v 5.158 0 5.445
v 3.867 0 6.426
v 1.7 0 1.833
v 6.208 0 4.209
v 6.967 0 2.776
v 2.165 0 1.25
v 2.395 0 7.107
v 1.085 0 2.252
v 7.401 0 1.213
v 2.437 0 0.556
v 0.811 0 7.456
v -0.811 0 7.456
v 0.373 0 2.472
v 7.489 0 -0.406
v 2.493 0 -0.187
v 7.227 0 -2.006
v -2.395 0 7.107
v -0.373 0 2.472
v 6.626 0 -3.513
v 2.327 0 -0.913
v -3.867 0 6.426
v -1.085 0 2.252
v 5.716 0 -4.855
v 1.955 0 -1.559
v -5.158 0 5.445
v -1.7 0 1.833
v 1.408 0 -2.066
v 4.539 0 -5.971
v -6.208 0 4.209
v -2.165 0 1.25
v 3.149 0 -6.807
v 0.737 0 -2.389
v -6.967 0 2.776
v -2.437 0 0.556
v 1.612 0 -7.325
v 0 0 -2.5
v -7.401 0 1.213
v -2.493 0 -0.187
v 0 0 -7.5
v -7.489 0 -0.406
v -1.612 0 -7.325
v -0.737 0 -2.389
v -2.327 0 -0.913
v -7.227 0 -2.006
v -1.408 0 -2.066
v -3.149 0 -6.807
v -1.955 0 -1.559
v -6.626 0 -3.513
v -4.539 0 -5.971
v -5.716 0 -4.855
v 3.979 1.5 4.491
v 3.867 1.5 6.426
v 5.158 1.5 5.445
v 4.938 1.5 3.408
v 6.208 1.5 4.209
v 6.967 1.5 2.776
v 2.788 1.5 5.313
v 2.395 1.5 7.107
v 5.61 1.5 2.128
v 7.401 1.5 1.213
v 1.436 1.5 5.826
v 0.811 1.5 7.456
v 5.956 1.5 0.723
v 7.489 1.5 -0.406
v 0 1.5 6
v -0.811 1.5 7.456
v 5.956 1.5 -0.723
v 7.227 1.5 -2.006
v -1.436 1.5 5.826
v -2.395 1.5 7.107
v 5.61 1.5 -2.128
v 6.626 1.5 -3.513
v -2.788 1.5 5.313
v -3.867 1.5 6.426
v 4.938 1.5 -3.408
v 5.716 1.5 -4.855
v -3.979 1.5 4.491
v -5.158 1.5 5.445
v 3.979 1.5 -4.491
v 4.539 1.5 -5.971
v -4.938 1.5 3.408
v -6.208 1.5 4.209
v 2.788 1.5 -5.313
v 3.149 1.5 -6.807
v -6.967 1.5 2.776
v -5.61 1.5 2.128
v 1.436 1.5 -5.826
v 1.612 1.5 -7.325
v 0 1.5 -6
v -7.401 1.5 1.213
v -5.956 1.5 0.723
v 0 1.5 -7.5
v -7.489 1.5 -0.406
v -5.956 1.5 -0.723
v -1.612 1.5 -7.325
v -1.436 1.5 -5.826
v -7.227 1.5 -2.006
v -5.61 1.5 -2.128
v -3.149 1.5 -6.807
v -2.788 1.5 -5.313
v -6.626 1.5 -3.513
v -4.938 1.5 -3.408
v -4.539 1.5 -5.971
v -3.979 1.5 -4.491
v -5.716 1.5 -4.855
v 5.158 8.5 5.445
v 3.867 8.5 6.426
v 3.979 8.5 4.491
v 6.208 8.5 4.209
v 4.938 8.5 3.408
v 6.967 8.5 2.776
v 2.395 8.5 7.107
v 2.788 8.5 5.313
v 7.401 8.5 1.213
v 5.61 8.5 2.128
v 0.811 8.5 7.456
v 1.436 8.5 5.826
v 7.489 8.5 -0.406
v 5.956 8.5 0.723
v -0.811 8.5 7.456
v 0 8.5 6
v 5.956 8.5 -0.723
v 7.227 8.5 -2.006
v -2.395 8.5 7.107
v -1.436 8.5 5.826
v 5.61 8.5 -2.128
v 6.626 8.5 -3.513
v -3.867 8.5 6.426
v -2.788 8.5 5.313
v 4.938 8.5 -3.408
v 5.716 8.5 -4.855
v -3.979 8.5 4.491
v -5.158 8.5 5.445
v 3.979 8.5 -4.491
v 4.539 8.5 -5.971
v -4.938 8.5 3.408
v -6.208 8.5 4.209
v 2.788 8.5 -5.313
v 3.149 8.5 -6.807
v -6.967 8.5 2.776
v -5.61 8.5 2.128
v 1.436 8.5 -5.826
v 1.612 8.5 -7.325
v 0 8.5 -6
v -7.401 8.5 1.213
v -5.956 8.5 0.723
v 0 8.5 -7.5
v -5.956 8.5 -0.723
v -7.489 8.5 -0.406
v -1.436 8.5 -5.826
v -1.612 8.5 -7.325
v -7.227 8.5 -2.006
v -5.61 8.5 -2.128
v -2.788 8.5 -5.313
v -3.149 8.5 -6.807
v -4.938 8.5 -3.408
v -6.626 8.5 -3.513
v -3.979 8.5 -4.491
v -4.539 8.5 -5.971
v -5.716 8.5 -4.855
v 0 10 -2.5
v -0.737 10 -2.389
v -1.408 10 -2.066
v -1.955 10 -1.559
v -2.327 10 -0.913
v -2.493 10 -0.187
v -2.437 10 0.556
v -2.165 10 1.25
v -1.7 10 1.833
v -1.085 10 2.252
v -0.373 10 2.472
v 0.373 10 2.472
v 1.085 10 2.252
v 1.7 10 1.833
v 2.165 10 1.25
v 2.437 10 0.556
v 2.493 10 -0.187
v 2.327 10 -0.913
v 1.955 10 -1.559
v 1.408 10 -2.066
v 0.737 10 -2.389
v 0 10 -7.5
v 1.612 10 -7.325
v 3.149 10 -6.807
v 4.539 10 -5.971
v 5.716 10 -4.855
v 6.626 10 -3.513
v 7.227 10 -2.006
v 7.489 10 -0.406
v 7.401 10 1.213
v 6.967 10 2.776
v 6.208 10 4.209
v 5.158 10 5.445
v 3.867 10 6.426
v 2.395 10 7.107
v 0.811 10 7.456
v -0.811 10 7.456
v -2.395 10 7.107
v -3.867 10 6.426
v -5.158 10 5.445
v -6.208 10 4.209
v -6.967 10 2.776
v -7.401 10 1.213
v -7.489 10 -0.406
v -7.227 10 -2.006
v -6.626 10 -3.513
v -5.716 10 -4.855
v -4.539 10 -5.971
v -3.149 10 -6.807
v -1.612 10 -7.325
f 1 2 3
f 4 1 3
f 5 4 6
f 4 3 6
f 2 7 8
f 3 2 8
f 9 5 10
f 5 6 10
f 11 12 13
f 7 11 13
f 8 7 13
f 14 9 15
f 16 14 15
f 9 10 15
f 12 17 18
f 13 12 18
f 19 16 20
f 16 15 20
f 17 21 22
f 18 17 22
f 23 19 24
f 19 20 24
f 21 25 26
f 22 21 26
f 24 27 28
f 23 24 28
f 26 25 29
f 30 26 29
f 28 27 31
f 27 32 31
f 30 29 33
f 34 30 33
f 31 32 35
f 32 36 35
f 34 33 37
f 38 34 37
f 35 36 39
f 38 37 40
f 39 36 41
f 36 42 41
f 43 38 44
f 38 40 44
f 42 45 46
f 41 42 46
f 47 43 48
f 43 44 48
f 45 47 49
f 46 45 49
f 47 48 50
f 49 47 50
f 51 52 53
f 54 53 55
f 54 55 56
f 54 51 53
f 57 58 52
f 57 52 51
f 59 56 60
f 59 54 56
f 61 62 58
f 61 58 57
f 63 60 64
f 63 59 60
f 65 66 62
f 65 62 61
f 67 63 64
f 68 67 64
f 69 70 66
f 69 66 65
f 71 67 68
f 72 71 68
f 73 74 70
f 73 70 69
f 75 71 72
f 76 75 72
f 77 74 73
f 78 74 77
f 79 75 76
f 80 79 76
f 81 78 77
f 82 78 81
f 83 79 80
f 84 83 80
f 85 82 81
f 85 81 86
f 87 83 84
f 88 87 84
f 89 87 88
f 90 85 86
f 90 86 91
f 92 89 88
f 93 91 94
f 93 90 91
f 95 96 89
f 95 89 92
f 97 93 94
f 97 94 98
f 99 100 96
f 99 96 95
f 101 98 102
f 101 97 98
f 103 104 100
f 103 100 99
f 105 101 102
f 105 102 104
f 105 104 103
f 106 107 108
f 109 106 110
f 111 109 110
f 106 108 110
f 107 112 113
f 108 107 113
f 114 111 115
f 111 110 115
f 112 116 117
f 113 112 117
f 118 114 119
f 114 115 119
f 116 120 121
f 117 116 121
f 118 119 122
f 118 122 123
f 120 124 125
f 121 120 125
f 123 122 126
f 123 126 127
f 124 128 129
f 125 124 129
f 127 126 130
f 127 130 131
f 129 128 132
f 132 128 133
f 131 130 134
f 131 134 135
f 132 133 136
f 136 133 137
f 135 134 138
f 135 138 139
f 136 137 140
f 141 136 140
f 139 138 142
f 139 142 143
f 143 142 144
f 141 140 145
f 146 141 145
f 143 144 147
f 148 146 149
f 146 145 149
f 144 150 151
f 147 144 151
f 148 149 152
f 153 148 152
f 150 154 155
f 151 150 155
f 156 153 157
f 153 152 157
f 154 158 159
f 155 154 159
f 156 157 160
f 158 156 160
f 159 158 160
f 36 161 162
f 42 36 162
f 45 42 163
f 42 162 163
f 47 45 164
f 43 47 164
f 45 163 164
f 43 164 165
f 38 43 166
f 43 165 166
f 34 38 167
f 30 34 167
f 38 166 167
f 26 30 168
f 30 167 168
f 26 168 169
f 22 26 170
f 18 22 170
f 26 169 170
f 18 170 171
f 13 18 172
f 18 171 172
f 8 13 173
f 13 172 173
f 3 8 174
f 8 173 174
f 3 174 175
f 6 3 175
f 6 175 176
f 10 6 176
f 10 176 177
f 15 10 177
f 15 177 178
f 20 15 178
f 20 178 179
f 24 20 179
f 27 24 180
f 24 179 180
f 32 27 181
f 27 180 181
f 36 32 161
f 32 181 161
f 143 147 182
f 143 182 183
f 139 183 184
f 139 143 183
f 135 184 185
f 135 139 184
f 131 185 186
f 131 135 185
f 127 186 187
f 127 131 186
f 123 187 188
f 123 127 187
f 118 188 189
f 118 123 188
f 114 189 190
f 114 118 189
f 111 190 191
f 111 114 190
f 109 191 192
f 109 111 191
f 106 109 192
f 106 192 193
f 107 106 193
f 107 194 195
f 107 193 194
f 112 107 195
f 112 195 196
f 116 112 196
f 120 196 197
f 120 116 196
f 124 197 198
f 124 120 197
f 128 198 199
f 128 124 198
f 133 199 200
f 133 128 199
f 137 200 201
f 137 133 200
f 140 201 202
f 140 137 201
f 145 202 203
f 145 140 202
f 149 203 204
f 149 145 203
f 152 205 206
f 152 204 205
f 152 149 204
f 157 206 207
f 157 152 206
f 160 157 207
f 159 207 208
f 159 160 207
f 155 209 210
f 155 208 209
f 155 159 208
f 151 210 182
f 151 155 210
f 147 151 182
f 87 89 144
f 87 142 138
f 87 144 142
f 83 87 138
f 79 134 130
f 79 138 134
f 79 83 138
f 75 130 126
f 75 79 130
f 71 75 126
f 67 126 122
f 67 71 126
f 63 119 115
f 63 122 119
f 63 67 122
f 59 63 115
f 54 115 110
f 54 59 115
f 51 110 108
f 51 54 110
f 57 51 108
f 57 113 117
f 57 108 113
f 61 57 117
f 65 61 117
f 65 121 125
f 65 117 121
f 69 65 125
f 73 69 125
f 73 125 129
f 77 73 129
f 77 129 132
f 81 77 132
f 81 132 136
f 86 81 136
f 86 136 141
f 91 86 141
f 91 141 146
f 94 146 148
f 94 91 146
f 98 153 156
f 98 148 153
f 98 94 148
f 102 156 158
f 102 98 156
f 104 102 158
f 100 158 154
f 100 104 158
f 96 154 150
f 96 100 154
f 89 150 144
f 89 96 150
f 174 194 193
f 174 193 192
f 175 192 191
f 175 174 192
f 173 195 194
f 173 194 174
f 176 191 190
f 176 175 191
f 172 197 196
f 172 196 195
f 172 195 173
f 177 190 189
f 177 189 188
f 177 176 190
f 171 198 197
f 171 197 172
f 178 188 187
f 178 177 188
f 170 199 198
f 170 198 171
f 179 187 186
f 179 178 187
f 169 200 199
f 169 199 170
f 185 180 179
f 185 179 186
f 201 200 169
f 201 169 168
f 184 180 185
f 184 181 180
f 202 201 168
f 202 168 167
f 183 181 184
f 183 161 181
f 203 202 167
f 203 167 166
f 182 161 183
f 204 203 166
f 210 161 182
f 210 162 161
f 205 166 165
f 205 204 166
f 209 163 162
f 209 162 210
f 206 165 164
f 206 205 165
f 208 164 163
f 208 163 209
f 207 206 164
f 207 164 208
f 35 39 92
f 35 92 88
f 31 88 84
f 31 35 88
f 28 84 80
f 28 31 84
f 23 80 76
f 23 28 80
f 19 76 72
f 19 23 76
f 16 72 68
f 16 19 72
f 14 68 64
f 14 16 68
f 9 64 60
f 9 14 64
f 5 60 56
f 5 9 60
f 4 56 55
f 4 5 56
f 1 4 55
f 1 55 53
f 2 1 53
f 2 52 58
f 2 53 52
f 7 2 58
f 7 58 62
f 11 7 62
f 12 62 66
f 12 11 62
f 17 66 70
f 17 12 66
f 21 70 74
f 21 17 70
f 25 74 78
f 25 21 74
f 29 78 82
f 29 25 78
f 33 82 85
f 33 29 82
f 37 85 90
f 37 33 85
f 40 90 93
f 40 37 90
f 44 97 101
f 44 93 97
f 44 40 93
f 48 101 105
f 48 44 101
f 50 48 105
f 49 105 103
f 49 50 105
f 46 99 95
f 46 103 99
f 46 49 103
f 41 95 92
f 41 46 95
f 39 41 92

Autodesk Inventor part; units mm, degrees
ref_plane "YZ Plane" through (0, 0, 0) normal (1, 0, 0) x (0, 1, 0)
ref_plane "XZ Plane" through (0, 0, 0) normal (0, 1, 0) x (-1, 0, 0)
ref_plane "XY Plane" through (0, 0, 0) normal (0, 0, 1) x (1, 0, 0)
sketch "Sketch1" plane through (0, 0, 0) normal (1, 0, 0) x (0, 1, 0)
  line L0 (0, 0) -> (17.2785, 0)
  line L1 (0, -2.5) -> (10, -2.5)
  line L2 (10, -2.5) -> (10, -7.5)
  line L3 (10, -7.5) -> (8.5, -7.5)
  line L4 (8.5, -7.5) -> (8.5, -6)
  line L5 (8.5, -6) -> (1.5, -6)
  line L6 (1.5, -6) -> (1.5, -7.5)
  line L7 (1.5, -7.5) -> (0, -7.5)
  line L8 (0, -7.5) -> (0, -2.5)
  point P0 (5, -2.5)
  dimension "d1" = 5
  dimension "d2" = 15
  dimension "d3" = 12
  dimension "d4" = 7
  dimension "d5" = 1.5
revolve "Revolution1" add sketch "Sketch1" angle 360 about axis through (0, 0, 0) along (0, 1, 0)
properties part number "6mm toothed idler" material "Aluminum 6061"
